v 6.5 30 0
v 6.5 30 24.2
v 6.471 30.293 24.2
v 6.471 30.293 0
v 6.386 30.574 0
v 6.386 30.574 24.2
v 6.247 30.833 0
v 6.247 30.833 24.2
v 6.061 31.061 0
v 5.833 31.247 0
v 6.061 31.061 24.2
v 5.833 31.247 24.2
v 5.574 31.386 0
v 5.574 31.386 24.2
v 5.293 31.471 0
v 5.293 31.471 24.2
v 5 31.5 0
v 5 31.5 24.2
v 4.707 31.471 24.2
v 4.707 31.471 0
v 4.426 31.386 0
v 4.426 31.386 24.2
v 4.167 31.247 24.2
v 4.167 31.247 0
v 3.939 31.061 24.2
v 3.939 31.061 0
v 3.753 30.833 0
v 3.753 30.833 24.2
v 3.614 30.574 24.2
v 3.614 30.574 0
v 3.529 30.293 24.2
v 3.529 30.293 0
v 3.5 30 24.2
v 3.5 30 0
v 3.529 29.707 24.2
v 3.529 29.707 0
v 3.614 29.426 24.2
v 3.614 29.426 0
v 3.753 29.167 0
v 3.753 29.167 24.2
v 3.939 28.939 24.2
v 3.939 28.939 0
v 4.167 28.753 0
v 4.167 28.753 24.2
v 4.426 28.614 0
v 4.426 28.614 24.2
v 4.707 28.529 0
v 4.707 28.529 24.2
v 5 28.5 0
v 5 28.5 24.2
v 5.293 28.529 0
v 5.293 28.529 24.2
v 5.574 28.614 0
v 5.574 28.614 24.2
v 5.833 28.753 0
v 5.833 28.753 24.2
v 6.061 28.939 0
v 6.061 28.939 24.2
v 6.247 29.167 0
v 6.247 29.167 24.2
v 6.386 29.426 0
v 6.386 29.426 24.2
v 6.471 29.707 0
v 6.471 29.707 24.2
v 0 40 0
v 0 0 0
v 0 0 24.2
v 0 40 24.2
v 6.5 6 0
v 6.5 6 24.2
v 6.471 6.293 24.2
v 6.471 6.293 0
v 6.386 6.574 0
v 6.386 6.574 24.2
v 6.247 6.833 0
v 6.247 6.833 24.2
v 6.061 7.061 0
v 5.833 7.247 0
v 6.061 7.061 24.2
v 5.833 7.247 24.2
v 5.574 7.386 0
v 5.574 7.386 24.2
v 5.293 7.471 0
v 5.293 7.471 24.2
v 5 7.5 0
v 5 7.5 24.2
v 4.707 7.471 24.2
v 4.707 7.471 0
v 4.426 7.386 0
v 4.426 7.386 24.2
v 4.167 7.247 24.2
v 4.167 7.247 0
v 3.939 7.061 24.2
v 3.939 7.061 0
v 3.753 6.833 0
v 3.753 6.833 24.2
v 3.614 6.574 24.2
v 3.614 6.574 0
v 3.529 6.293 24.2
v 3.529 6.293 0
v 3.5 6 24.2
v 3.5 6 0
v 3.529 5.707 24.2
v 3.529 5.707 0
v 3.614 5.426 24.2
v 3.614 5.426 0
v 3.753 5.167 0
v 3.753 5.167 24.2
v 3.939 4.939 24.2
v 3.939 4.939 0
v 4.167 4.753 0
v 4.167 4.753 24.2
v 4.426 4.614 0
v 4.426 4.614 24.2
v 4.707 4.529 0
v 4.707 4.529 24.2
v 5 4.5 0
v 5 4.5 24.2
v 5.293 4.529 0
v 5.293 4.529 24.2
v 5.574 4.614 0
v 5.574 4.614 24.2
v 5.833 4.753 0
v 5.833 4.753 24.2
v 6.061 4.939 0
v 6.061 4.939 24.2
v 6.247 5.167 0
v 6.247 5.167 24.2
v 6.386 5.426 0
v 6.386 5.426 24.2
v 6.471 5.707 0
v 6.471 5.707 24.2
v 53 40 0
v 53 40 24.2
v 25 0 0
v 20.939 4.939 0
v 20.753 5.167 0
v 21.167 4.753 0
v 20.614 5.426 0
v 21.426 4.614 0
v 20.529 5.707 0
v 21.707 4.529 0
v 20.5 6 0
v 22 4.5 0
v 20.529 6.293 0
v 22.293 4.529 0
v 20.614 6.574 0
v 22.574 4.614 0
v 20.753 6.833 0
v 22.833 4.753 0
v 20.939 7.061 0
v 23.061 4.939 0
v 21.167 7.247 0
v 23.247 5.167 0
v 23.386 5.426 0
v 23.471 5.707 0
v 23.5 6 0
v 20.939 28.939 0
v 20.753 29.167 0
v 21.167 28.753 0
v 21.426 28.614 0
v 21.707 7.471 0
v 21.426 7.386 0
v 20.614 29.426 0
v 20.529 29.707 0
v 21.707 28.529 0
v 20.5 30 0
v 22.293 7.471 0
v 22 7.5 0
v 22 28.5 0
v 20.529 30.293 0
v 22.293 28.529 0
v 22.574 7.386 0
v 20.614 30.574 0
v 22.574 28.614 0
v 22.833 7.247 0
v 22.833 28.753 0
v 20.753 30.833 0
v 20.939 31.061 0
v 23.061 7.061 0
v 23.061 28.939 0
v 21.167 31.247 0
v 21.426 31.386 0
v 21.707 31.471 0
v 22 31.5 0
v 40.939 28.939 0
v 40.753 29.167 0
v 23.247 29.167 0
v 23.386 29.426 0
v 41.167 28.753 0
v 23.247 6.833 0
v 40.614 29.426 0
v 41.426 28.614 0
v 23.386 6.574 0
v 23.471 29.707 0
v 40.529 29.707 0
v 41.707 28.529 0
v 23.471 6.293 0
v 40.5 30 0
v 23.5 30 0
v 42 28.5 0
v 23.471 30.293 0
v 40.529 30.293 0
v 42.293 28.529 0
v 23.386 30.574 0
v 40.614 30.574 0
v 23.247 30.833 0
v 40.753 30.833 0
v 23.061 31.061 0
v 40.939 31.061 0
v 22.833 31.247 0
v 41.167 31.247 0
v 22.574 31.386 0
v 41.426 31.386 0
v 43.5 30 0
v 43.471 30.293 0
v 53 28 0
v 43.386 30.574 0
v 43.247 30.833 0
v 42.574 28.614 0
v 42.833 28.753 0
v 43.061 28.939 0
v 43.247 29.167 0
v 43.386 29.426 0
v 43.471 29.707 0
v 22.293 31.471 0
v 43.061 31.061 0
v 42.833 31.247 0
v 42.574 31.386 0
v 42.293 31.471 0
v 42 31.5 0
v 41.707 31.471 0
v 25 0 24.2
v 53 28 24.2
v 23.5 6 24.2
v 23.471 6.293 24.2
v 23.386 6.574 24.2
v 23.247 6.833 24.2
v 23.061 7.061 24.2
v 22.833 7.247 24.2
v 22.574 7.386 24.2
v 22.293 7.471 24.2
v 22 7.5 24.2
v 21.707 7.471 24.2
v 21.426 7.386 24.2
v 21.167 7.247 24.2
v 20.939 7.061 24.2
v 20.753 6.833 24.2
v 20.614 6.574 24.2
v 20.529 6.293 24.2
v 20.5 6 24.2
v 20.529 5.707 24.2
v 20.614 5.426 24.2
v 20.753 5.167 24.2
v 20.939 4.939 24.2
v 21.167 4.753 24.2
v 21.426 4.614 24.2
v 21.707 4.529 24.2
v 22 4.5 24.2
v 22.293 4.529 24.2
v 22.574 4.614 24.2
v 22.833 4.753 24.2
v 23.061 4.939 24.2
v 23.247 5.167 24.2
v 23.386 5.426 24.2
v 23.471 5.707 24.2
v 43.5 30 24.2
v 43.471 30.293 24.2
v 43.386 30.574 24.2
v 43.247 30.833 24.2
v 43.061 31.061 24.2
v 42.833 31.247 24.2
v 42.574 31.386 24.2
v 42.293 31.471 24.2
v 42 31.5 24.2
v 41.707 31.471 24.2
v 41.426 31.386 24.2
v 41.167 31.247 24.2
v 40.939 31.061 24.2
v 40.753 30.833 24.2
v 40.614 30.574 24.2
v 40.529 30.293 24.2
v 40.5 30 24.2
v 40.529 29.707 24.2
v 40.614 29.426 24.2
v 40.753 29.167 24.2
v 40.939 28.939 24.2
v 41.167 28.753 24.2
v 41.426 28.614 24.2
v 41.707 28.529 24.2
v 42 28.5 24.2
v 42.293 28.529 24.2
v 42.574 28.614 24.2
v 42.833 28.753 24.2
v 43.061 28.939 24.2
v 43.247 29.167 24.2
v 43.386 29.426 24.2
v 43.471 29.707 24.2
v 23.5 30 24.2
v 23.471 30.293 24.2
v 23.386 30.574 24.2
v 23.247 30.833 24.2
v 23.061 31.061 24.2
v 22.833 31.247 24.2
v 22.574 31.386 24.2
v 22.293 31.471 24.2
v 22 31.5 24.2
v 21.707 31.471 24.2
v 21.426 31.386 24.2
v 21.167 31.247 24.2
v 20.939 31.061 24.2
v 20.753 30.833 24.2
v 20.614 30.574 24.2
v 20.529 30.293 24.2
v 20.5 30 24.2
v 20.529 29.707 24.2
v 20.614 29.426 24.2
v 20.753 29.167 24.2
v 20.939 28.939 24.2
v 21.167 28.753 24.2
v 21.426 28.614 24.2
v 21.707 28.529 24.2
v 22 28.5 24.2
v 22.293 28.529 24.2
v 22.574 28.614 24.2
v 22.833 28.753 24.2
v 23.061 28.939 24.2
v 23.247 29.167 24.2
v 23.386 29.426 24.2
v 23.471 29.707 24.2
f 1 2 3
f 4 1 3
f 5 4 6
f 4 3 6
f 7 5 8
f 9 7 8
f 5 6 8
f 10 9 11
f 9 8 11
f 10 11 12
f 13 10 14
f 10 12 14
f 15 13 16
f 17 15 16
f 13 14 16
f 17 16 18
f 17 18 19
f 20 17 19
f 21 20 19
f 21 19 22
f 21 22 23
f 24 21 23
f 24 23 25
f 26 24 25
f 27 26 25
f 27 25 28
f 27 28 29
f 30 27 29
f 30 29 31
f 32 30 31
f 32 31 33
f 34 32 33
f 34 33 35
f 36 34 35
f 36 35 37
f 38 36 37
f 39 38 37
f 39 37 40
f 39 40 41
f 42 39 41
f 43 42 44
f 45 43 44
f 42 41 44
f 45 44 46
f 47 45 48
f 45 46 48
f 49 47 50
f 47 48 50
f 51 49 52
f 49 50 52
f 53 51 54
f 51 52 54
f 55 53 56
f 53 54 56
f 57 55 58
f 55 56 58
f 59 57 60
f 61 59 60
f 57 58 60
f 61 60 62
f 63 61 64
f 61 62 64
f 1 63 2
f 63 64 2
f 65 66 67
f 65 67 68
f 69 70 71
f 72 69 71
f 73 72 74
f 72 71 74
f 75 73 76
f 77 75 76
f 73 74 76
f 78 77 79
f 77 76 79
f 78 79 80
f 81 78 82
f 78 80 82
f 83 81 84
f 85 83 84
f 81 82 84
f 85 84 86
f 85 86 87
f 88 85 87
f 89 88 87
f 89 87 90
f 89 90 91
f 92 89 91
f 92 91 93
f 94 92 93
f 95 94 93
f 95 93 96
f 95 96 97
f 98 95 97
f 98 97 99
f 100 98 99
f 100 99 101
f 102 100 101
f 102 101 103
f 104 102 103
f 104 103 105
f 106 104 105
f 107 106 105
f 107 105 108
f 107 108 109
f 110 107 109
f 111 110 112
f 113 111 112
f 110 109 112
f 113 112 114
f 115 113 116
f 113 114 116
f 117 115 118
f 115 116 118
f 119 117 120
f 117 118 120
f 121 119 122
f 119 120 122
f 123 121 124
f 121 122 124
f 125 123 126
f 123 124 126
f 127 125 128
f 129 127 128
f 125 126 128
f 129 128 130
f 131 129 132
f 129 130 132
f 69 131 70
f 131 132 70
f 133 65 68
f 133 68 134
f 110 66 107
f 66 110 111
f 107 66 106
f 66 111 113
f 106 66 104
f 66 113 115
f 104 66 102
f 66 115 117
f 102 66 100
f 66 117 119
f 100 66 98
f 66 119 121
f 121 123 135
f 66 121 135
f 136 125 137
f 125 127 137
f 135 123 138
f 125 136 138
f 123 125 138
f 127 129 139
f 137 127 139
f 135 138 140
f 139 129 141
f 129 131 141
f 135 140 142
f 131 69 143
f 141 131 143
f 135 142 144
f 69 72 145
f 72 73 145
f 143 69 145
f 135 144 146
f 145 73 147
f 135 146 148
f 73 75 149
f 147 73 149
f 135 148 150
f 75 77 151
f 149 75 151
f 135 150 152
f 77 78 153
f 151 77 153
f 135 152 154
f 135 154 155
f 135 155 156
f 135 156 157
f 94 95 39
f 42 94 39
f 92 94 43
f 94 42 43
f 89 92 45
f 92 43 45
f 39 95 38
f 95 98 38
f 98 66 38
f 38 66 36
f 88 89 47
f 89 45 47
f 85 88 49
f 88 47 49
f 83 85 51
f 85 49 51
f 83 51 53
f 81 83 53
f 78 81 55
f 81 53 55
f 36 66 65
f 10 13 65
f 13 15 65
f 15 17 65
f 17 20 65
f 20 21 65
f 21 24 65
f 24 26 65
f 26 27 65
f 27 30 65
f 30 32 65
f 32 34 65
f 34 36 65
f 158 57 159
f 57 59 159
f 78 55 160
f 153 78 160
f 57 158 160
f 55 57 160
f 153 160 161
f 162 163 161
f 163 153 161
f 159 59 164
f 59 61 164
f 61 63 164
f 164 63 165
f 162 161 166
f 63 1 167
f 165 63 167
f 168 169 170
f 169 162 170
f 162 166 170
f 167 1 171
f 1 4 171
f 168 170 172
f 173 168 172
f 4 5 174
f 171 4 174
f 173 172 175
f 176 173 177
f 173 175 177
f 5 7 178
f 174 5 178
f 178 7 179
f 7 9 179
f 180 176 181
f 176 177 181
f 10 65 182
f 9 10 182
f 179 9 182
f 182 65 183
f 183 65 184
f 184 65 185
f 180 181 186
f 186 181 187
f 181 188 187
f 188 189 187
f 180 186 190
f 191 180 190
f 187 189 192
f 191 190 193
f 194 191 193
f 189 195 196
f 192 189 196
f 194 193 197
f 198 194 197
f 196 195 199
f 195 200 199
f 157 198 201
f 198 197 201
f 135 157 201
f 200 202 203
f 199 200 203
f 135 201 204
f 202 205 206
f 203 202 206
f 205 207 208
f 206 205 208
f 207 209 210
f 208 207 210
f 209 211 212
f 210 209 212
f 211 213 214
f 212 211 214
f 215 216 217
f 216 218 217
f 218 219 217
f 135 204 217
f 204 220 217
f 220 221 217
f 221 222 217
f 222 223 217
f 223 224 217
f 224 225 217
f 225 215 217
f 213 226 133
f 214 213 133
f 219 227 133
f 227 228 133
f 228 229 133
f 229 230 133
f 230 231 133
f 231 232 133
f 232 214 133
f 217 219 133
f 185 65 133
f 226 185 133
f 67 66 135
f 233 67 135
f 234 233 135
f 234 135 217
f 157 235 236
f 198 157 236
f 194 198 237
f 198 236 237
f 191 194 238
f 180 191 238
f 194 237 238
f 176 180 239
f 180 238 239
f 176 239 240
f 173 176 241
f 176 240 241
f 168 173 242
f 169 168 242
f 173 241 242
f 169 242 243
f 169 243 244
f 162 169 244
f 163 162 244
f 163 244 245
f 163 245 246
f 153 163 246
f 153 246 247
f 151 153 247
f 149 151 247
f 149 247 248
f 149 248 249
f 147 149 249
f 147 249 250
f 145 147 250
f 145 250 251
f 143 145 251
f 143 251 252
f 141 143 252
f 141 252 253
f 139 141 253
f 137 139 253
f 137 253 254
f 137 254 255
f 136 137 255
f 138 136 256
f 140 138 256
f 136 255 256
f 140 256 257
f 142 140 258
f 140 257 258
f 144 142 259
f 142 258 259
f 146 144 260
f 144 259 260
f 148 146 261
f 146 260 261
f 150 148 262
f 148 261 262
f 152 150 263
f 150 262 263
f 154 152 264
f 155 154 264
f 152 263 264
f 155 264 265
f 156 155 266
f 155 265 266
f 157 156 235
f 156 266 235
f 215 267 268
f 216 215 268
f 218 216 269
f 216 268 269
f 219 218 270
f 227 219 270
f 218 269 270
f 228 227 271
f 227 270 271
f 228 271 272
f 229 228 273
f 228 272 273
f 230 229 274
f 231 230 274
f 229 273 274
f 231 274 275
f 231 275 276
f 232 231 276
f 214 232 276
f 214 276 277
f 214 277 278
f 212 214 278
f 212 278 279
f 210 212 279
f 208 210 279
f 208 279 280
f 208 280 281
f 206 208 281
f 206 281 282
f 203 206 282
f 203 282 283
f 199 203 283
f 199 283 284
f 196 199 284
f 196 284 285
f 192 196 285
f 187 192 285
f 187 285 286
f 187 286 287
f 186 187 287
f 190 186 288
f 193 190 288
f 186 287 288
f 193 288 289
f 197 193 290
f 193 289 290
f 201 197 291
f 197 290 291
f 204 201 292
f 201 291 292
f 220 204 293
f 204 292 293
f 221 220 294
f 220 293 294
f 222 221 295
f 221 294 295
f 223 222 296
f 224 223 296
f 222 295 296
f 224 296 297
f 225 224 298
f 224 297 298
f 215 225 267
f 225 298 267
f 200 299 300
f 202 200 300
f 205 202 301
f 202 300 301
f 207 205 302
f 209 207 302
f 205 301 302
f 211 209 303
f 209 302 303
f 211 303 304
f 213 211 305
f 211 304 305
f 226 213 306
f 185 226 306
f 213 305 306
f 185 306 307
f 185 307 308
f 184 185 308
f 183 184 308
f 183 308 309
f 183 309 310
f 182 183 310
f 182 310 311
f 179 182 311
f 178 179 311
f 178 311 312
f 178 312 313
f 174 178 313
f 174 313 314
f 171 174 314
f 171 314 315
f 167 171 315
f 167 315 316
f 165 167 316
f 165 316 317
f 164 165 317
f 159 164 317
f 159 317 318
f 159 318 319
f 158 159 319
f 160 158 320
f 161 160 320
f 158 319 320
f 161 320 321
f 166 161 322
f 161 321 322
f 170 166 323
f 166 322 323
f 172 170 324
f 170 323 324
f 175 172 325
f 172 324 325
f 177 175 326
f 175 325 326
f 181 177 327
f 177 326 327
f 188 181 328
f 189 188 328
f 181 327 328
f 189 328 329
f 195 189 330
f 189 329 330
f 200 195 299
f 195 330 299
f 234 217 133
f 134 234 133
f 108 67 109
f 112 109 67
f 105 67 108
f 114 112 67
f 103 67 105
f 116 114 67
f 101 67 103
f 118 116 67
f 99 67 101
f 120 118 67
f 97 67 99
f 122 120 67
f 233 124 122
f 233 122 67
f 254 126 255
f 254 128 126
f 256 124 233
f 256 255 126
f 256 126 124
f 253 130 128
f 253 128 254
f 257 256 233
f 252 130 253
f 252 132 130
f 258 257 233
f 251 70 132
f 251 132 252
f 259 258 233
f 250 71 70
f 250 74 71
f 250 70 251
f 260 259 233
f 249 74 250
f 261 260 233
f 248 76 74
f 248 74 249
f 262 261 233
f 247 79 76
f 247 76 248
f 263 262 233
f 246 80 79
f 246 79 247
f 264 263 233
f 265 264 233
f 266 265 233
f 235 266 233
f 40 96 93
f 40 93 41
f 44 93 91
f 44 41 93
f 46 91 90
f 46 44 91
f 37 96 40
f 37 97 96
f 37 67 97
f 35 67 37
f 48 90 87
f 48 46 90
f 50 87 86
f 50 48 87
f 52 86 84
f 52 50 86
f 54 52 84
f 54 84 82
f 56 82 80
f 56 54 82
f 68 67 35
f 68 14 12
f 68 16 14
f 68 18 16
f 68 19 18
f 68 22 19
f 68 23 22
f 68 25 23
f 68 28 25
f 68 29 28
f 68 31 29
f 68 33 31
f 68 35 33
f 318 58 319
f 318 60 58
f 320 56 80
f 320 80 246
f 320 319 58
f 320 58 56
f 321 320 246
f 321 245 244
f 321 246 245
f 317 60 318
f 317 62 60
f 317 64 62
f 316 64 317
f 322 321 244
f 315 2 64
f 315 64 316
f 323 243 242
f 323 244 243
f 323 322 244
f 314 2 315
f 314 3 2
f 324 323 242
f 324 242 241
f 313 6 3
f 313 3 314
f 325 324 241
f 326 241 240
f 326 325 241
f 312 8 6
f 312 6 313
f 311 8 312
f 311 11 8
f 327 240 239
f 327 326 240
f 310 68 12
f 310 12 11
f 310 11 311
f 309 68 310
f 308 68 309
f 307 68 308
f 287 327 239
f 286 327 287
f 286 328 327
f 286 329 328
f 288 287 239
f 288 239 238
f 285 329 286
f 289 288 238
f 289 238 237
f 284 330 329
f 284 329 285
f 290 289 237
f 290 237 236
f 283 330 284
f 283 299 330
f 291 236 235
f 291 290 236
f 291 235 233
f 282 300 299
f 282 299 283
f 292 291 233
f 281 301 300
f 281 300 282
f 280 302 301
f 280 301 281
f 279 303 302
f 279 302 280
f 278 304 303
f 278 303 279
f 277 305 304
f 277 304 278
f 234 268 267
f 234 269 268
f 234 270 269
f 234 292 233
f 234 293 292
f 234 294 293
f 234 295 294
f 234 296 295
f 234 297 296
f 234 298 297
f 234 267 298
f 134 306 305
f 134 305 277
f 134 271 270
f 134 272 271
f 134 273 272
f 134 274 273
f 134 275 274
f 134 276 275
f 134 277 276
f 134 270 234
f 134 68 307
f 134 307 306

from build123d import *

# Parameters (mm, degrees)
SKETCH_1_W          = 53
SKETCH_1_H          = 40
EXTRUDE_1_DEPTH     = 24.2
CUT_EXTRUDE_1_DEPTH = 71.672767032
SKETCH_3_R          = 1.5
CUT_EXTRUDE_2_DEPTH = 71.672767032


with BuildPart() as part:
    # 草图1 → 凸台-拉伸1 (new body)
    with BuildSketch(Plane.XY):
        with Locations((26.5, 20)):
            Rectangle(SKETCH_1_W, SKETCH_1_H)
    extrude(amount=EXTRUDE_1_DEPTH)

    # 草图2 → 切除-拉伸1 (cut, through all)
    with BuildSketch(Plane.XY.offset(24.2)):
        Polygon((53, 28), (53, 0), (25, 0), align=None)
    extrude(amount=-CUT_EXTRUDE_1_DEPTH, mode=Mode.SUBTRACT)

    # 草图3 → 切除-拉伸2 (cut, through all)
    with BuildSketch(Plane.XY.offset(24.2)):
        with Locations((5, 30)):
            Circle(SKETCH_3_R)
        with Locations((5, 6)):
            Circle(SKETCH_3_R)
        with Locations((22, 30)):
            Circle(SKETCH_3_R)
        with Locations((22, 6)):
            Circle(SKETCH_3_R)
        with Locations((42, 30)):
            Circle(SKETCH_3_R)
    extrude(amount=-CUT_EXTRUDE_2_DEPTH, mode=Mode.SUBTRACT)


solid = part.part
